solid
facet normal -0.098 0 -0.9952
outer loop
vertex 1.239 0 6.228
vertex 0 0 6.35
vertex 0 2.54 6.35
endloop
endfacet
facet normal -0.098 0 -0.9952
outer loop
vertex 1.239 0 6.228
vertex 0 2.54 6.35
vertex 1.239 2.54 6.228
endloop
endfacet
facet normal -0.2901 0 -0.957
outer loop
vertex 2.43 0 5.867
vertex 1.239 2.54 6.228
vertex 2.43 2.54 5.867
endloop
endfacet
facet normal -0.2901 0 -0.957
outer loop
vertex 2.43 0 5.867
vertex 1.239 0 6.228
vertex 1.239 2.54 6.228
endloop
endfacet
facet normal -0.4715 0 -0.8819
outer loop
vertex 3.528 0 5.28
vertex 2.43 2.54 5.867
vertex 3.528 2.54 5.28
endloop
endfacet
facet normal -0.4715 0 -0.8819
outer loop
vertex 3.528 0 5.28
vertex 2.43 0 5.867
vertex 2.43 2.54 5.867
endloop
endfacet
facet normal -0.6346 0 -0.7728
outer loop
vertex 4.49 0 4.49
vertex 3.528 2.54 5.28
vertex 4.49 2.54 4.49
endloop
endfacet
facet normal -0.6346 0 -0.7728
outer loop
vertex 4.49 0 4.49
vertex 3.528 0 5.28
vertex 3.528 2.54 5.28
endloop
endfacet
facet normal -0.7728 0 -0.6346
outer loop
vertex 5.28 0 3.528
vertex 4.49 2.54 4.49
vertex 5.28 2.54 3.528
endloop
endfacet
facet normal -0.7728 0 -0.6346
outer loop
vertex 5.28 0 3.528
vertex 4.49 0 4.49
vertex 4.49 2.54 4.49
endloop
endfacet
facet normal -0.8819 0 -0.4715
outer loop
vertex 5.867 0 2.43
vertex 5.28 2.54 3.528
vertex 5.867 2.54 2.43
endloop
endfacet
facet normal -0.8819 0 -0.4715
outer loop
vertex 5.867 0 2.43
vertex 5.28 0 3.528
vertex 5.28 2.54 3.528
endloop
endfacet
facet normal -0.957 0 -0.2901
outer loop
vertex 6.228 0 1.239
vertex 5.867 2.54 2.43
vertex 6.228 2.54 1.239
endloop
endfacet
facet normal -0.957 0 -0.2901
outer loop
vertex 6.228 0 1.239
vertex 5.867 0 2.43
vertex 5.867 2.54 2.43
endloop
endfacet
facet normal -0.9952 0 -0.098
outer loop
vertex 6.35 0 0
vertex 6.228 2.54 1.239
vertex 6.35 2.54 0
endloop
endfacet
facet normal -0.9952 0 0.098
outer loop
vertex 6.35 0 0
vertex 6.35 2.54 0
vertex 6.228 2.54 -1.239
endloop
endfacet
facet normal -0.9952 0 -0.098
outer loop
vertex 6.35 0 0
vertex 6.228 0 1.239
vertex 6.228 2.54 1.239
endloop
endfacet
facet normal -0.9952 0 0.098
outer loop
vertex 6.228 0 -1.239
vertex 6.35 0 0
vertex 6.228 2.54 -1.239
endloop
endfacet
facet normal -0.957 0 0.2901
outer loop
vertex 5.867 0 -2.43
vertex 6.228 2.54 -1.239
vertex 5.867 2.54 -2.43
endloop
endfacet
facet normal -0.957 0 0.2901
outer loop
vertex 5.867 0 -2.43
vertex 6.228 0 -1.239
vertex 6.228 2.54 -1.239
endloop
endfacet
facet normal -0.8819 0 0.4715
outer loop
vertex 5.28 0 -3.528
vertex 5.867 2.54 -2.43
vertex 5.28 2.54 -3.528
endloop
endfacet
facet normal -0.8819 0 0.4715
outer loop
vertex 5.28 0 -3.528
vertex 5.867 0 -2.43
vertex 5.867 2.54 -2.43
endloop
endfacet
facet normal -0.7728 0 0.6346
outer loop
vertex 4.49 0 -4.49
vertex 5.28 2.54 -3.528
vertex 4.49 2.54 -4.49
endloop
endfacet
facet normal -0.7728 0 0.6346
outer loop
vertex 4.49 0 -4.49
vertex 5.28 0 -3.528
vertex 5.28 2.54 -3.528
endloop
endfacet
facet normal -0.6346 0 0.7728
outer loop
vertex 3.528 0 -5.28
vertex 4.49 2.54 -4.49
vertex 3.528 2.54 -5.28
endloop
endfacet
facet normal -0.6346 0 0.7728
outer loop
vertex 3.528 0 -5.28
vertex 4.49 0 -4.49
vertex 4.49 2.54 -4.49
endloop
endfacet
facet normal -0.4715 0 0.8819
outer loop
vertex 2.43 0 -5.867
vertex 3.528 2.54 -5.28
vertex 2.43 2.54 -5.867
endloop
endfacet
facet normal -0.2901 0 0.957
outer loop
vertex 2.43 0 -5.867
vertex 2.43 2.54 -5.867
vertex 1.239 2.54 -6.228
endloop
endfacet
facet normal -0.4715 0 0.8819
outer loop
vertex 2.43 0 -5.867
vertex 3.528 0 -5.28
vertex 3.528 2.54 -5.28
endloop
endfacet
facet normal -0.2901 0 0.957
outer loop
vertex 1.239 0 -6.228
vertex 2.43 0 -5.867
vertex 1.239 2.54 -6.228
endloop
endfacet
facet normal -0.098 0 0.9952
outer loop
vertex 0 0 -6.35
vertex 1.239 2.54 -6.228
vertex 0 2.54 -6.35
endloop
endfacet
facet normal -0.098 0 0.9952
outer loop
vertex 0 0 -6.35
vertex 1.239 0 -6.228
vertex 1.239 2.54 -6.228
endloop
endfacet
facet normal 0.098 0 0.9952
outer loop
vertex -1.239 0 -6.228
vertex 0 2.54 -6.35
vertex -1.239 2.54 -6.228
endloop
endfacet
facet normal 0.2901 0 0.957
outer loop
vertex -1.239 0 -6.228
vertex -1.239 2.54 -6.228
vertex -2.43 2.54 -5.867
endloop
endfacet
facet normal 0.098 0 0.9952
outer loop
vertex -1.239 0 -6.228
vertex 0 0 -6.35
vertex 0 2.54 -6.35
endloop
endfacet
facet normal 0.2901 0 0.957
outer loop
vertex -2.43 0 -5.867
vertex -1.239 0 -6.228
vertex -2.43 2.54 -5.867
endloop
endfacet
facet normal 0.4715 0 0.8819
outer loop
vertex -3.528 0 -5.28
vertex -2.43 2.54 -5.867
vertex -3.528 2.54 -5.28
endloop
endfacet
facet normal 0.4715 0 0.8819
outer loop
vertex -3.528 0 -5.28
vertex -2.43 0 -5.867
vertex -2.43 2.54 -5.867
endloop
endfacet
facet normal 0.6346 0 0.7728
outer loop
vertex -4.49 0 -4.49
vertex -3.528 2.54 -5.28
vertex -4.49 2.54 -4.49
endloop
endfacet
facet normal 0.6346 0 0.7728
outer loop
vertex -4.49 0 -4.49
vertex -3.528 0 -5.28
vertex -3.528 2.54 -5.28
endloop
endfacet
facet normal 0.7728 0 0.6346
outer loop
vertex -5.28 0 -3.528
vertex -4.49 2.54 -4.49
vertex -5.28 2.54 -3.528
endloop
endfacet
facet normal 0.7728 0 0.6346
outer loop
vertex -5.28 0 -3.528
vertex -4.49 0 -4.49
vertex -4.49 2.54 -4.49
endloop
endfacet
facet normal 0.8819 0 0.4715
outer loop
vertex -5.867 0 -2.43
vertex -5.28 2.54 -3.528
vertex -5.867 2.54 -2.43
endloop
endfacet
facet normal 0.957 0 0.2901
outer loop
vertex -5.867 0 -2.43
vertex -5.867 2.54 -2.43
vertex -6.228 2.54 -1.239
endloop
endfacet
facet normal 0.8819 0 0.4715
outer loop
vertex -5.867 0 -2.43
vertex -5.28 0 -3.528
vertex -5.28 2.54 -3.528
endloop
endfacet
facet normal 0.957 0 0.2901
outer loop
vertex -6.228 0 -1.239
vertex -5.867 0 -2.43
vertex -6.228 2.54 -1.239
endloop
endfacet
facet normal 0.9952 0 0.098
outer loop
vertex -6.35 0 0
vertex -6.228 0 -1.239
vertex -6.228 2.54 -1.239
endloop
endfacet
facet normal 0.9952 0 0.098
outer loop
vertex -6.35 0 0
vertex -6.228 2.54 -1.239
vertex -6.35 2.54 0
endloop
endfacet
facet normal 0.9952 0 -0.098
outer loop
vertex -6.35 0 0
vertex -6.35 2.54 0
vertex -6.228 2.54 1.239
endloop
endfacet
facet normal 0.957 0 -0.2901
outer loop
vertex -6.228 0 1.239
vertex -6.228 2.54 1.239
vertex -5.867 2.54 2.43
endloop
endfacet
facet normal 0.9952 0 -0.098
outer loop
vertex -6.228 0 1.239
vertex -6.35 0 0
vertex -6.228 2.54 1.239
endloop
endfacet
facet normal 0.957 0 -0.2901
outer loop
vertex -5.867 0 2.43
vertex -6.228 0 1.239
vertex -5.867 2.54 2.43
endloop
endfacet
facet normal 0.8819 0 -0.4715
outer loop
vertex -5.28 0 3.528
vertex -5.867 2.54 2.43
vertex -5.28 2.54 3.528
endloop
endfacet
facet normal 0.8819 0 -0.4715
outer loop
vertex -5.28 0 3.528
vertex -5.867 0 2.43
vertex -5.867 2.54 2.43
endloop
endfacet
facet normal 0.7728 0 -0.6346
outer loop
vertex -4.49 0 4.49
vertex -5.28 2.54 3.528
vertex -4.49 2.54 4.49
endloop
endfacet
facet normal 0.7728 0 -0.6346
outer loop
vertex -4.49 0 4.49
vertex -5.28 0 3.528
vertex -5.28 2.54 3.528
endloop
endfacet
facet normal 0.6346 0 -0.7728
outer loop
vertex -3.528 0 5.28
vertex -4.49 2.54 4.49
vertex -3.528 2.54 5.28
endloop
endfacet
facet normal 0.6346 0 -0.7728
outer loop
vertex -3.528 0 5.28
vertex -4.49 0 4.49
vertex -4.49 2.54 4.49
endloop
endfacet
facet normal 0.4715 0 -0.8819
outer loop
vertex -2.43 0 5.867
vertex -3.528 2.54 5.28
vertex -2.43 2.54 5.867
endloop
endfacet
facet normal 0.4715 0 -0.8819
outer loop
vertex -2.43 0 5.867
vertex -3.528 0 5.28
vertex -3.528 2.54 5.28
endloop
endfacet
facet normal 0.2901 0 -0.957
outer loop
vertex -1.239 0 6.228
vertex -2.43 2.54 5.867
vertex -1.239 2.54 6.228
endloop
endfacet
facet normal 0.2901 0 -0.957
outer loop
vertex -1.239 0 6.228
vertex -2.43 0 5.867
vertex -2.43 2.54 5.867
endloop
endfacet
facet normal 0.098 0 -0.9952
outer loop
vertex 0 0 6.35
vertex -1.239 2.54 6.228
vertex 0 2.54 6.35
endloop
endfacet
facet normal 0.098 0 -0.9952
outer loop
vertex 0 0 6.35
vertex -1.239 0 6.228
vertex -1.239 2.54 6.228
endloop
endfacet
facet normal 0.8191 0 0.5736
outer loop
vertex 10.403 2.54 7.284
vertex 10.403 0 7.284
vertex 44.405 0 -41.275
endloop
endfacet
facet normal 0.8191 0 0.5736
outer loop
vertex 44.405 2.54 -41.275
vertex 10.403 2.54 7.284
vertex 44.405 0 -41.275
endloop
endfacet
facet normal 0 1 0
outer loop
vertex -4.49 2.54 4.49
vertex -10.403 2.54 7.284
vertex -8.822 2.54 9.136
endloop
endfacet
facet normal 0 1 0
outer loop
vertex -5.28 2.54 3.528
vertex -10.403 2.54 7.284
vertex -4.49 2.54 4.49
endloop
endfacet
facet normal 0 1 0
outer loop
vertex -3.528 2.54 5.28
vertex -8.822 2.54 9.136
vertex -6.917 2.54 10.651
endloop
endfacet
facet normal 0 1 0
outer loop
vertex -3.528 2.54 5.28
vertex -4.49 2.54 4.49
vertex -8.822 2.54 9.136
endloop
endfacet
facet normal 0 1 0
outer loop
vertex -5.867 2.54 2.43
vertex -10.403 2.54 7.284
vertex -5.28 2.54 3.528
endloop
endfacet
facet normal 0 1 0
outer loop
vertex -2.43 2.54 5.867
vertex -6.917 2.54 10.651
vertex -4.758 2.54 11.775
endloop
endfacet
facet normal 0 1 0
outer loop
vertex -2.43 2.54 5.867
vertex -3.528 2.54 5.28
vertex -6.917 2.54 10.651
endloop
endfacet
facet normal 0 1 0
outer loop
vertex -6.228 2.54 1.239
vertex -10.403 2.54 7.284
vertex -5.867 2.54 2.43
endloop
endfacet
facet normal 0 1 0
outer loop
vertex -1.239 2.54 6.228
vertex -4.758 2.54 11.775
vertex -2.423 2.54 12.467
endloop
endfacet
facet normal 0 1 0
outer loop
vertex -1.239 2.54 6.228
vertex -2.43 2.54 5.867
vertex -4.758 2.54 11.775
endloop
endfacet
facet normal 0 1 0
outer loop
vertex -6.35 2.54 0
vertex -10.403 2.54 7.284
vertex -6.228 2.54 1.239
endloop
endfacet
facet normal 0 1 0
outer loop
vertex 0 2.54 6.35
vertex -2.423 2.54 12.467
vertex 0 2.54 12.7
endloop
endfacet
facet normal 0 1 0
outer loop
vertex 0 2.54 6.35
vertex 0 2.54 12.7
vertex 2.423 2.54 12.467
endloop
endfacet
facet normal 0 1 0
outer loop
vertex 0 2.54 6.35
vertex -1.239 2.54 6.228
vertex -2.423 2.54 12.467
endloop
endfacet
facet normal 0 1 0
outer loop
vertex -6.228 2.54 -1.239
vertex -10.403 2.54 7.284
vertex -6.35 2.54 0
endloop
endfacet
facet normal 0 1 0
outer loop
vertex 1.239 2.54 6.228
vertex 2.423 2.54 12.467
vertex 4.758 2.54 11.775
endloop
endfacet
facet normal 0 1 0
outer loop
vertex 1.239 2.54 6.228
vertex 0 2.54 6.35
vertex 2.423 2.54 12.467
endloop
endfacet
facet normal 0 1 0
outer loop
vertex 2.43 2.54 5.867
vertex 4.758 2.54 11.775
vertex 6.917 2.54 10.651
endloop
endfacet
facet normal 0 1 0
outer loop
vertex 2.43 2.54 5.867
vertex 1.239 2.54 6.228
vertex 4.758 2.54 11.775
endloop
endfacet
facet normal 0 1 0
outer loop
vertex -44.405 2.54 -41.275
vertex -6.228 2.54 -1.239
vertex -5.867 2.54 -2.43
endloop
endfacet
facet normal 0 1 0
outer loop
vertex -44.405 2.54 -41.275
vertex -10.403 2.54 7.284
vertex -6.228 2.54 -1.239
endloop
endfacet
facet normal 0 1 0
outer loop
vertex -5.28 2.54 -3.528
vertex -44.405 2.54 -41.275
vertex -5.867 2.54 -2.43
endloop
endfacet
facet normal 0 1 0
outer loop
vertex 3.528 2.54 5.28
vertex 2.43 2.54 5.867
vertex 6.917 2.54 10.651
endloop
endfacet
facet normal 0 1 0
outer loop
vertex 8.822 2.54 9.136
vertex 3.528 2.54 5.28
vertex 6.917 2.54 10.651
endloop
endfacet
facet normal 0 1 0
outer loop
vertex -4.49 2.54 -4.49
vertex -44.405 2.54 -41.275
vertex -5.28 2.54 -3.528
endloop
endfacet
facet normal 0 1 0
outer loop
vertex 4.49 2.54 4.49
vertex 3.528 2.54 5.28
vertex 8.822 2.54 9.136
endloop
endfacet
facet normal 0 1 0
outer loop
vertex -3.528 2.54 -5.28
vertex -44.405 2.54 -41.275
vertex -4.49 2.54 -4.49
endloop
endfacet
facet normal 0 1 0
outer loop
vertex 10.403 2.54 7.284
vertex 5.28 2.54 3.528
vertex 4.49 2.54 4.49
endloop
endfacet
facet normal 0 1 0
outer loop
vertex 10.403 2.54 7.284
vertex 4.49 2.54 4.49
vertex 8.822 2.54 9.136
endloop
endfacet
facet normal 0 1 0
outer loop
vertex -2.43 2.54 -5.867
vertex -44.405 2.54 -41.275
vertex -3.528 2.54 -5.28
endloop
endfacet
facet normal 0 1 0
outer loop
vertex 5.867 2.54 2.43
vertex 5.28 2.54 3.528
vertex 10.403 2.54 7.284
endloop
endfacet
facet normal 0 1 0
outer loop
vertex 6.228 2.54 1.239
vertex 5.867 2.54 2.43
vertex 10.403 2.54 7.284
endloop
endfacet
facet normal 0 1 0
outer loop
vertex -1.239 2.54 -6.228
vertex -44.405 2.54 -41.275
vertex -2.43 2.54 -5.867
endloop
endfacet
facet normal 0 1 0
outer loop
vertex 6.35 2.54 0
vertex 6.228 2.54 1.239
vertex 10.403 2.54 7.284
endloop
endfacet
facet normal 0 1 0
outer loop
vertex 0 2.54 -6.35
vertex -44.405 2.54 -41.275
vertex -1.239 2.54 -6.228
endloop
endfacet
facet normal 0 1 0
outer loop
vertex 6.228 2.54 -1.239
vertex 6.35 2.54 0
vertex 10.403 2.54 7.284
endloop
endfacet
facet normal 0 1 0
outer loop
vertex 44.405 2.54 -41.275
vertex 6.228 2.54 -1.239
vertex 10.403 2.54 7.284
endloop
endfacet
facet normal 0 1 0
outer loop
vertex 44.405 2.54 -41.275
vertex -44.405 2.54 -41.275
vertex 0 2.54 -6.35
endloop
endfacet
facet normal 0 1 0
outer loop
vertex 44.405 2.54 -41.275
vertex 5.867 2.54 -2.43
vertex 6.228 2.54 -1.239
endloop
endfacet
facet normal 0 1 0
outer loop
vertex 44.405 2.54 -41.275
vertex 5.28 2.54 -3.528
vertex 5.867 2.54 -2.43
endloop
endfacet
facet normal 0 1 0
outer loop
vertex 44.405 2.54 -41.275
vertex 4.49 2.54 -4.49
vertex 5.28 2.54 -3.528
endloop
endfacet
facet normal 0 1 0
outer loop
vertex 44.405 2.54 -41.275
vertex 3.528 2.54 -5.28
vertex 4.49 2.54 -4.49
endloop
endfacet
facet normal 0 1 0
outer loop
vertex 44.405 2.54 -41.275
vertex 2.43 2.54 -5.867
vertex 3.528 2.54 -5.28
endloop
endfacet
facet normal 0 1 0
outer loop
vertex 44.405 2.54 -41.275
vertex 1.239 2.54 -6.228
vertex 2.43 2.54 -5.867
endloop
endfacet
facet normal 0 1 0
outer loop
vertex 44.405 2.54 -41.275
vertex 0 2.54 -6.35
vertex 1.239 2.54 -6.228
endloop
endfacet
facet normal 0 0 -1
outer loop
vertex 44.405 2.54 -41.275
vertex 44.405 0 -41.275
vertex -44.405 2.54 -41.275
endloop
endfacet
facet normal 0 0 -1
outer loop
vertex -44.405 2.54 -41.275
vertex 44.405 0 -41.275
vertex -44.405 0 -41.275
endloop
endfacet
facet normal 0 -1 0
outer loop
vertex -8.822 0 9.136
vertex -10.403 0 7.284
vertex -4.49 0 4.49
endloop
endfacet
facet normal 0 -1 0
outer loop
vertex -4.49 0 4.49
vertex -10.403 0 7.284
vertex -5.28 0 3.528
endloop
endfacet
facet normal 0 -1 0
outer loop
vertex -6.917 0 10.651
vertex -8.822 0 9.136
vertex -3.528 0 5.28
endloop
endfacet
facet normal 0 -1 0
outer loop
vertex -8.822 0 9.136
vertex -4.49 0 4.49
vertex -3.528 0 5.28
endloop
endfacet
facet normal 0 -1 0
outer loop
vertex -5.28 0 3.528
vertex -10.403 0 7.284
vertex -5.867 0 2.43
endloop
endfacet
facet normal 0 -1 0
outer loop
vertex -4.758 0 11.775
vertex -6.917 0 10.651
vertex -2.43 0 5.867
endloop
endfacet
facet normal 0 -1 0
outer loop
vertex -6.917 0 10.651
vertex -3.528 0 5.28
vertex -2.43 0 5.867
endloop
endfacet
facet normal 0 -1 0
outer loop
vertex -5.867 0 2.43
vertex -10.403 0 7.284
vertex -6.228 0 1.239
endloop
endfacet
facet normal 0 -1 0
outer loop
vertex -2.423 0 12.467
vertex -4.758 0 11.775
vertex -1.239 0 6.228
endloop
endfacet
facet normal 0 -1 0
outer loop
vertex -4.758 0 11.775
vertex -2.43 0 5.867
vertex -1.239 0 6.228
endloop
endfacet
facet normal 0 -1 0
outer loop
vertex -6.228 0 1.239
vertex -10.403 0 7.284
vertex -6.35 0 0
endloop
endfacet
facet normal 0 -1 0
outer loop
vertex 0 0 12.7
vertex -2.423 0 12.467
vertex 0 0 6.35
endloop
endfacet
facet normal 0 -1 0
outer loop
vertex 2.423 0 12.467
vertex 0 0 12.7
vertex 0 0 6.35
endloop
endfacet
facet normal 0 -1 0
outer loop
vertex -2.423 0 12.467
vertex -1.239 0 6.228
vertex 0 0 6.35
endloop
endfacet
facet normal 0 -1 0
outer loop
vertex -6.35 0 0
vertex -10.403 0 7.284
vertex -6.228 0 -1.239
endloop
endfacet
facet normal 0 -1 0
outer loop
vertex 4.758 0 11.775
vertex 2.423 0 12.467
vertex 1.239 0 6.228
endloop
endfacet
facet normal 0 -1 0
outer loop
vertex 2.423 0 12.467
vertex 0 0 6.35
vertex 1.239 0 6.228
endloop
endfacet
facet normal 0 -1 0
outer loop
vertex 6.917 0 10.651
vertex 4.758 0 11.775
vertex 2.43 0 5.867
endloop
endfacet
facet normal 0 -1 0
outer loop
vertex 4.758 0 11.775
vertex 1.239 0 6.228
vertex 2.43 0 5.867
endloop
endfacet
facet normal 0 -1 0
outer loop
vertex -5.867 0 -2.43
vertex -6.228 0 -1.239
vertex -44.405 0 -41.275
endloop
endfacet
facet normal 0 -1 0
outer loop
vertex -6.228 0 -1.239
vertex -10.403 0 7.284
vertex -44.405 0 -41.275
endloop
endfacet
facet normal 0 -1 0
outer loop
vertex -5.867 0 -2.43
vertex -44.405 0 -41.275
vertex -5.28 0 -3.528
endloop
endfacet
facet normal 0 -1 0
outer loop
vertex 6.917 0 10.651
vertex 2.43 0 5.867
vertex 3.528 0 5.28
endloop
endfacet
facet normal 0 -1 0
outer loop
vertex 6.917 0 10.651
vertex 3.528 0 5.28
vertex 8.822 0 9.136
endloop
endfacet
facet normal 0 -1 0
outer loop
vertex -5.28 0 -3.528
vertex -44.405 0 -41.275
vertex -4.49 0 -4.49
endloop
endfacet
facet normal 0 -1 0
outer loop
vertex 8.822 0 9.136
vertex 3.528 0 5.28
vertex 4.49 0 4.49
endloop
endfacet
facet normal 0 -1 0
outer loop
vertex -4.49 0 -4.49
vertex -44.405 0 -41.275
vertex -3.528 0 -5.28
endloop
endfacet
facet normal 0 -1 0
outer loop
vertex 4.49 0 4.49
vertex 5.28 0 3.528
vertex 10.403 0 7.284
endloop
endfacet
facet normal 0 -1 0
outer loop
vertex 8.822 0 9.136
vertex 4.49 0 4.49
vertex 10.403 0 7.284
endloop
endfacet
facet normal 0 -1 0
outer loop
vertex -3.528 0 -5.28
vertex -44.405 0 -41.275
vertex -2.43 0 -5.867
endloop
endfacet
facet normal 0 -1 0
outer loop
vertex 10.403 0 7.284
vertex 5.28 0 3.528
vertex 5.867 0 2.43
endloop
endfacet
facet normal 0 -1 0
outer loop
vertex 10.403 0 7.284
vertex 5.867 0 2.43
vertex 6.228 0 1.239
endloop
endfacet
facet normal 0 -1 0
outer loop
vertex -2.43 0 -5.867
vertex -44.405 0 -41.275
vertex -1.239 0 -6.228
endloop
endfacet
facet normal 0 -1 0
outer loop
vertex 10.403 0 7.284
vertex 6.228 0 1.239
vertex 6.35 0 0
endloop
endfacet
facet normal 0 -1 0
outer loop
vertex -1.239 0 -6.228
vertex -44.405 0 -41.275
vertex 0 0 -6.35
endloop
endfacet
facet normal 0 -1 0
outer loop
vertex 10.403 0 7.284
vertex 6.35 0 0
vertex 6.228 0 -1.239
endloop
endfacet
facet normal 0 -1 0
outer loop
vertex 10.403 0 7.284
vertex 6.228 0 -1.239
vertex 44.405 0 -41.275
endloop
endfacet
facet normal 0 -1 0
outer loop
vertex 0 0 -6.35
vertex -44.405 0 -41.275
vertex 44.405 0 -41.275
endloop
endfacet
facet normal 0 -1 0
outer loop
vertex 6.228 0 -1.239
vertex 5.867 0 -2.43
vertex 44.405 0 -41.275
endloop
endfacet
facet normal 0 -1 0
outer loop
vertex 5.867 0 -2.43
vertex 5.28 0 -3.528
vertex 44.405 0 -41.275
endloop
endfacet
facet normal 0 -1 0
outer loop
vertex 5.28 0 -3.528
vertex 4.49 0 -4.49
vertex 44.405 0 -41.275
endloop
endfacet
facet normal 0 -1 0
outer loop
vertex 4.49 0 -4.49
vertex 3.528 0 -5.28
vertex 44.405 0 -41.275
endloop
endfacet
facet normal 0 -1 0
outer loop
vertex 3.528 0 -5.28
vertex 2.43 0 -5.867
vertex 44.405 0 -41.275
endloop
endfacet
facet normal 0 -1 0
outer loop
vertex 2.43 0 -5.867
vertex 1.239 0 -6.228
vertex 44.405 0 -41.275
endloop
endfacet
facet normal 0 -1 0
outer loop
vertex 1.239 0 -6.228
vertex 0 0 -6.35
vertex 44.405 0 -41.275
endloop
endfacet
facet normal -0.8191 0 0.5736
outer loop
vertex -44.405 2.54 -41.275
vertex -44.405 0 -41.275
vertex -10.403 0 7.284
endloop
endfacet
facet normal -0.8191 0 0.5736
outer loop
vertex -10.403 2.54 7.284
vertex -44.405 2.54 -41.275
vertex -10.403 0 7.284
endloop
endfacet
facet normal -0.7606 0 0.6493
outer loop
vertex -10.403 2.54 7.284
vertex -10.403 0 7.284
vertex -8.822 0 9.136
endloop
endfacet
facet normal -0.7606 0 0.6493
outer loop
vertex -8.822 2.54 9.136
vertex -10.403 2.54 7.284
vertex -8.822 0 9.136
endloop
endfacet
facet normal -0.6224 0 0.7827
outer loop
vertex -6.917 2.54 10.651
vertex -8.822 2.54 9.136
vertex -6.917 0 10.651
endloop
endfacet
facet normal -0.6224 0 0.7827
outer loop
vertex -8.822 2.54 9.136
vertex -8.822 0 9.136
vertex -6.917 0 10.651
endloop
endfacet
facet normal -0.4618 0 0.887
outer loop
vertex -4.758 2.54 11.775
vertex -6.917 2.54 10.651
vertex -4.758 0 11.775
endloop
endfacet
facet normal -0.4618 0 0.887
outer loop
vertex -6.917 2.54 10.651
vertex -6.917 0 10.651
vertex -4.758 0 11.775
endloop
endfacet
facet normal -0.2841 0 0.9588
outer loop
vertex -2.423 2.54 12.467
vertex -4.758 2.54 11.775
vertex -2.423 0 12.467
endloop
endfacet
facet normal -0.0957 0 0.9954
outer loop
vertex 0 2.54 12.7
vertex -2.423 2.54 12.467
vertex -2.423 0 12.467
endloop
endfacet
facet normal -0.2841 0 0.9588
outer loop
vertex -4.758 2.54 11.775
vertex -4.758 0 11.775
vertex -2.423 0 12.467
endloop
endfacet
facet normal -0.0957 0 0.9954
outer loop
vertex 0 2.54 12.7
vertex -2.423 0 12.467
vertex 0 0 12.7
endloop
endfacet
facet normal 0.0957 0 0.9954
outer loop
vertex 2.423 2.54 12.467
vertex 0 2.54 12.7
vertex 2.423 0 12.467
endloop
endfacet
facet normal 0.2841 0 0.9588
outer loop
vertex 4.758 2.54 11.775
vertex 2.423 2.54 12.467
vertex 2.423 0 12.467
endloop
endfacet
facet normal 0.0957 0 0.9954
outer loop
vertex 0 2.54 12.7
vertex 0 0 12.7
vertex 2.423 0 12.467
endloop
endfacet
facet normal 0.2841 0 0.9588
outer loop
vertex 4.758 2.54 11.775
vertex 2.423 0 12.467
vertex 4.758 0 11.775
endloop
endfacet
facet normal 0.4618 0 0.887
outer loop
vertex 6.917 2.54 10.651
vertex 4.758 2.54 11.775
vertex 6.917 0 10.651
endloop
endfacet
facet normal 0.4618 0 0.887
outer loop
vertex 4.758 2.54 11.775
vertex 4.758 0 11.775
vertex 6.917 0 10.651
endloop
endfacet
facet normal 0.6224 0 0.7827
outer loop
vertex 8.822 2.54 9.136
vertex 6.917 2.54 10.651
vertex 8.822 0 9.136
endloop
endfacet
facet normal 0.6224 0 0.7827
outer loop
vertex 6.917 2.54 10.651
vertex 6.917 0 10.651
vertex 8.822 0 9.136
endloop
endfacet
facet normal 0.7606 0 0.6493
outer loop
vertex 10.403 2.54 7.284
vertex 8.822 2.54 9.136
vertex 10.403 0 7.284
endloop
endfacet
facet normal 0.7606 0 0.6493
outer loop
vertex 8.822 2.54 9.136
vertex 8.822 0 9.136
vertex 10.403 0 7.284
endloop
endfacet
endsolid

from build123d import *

# Parameters (mm, degrees)
SKETCH1_R           = 6.35
BOSS_EXTRUDE1_DEPTH = 2.54


with BuildPart() as part:
    # Sketch1 → Boss-Extrude1 (new body)
    with BuildSketch(Plane(origin=(0, 0, 0), x_dir=(1, 0, 0), z_dir=(0, 1, 0))):
        with BuildLine():
            Line((10.403230962, -7.284420742), (44.404903417, 41.275))
            Line((44.404903417, 41.275), (-44.404903417, 41.275))
            Line((-44.404903417, 41.275), (-10.403230962, -7.284420742))
            ThreePointArc((-10.403230962, -7.284420742), (0, -12.7), (10.403230962, -7.284420742))
        make_face()
        with Locations(Location((0, 0, 0), (0, 0, 270))):
            Circle(SKETCH1_R, mode=Mode.SUBTRACT)
    extrude(amount=BOSS_EXTRUDE1_DEPTH)


solid = part.part
